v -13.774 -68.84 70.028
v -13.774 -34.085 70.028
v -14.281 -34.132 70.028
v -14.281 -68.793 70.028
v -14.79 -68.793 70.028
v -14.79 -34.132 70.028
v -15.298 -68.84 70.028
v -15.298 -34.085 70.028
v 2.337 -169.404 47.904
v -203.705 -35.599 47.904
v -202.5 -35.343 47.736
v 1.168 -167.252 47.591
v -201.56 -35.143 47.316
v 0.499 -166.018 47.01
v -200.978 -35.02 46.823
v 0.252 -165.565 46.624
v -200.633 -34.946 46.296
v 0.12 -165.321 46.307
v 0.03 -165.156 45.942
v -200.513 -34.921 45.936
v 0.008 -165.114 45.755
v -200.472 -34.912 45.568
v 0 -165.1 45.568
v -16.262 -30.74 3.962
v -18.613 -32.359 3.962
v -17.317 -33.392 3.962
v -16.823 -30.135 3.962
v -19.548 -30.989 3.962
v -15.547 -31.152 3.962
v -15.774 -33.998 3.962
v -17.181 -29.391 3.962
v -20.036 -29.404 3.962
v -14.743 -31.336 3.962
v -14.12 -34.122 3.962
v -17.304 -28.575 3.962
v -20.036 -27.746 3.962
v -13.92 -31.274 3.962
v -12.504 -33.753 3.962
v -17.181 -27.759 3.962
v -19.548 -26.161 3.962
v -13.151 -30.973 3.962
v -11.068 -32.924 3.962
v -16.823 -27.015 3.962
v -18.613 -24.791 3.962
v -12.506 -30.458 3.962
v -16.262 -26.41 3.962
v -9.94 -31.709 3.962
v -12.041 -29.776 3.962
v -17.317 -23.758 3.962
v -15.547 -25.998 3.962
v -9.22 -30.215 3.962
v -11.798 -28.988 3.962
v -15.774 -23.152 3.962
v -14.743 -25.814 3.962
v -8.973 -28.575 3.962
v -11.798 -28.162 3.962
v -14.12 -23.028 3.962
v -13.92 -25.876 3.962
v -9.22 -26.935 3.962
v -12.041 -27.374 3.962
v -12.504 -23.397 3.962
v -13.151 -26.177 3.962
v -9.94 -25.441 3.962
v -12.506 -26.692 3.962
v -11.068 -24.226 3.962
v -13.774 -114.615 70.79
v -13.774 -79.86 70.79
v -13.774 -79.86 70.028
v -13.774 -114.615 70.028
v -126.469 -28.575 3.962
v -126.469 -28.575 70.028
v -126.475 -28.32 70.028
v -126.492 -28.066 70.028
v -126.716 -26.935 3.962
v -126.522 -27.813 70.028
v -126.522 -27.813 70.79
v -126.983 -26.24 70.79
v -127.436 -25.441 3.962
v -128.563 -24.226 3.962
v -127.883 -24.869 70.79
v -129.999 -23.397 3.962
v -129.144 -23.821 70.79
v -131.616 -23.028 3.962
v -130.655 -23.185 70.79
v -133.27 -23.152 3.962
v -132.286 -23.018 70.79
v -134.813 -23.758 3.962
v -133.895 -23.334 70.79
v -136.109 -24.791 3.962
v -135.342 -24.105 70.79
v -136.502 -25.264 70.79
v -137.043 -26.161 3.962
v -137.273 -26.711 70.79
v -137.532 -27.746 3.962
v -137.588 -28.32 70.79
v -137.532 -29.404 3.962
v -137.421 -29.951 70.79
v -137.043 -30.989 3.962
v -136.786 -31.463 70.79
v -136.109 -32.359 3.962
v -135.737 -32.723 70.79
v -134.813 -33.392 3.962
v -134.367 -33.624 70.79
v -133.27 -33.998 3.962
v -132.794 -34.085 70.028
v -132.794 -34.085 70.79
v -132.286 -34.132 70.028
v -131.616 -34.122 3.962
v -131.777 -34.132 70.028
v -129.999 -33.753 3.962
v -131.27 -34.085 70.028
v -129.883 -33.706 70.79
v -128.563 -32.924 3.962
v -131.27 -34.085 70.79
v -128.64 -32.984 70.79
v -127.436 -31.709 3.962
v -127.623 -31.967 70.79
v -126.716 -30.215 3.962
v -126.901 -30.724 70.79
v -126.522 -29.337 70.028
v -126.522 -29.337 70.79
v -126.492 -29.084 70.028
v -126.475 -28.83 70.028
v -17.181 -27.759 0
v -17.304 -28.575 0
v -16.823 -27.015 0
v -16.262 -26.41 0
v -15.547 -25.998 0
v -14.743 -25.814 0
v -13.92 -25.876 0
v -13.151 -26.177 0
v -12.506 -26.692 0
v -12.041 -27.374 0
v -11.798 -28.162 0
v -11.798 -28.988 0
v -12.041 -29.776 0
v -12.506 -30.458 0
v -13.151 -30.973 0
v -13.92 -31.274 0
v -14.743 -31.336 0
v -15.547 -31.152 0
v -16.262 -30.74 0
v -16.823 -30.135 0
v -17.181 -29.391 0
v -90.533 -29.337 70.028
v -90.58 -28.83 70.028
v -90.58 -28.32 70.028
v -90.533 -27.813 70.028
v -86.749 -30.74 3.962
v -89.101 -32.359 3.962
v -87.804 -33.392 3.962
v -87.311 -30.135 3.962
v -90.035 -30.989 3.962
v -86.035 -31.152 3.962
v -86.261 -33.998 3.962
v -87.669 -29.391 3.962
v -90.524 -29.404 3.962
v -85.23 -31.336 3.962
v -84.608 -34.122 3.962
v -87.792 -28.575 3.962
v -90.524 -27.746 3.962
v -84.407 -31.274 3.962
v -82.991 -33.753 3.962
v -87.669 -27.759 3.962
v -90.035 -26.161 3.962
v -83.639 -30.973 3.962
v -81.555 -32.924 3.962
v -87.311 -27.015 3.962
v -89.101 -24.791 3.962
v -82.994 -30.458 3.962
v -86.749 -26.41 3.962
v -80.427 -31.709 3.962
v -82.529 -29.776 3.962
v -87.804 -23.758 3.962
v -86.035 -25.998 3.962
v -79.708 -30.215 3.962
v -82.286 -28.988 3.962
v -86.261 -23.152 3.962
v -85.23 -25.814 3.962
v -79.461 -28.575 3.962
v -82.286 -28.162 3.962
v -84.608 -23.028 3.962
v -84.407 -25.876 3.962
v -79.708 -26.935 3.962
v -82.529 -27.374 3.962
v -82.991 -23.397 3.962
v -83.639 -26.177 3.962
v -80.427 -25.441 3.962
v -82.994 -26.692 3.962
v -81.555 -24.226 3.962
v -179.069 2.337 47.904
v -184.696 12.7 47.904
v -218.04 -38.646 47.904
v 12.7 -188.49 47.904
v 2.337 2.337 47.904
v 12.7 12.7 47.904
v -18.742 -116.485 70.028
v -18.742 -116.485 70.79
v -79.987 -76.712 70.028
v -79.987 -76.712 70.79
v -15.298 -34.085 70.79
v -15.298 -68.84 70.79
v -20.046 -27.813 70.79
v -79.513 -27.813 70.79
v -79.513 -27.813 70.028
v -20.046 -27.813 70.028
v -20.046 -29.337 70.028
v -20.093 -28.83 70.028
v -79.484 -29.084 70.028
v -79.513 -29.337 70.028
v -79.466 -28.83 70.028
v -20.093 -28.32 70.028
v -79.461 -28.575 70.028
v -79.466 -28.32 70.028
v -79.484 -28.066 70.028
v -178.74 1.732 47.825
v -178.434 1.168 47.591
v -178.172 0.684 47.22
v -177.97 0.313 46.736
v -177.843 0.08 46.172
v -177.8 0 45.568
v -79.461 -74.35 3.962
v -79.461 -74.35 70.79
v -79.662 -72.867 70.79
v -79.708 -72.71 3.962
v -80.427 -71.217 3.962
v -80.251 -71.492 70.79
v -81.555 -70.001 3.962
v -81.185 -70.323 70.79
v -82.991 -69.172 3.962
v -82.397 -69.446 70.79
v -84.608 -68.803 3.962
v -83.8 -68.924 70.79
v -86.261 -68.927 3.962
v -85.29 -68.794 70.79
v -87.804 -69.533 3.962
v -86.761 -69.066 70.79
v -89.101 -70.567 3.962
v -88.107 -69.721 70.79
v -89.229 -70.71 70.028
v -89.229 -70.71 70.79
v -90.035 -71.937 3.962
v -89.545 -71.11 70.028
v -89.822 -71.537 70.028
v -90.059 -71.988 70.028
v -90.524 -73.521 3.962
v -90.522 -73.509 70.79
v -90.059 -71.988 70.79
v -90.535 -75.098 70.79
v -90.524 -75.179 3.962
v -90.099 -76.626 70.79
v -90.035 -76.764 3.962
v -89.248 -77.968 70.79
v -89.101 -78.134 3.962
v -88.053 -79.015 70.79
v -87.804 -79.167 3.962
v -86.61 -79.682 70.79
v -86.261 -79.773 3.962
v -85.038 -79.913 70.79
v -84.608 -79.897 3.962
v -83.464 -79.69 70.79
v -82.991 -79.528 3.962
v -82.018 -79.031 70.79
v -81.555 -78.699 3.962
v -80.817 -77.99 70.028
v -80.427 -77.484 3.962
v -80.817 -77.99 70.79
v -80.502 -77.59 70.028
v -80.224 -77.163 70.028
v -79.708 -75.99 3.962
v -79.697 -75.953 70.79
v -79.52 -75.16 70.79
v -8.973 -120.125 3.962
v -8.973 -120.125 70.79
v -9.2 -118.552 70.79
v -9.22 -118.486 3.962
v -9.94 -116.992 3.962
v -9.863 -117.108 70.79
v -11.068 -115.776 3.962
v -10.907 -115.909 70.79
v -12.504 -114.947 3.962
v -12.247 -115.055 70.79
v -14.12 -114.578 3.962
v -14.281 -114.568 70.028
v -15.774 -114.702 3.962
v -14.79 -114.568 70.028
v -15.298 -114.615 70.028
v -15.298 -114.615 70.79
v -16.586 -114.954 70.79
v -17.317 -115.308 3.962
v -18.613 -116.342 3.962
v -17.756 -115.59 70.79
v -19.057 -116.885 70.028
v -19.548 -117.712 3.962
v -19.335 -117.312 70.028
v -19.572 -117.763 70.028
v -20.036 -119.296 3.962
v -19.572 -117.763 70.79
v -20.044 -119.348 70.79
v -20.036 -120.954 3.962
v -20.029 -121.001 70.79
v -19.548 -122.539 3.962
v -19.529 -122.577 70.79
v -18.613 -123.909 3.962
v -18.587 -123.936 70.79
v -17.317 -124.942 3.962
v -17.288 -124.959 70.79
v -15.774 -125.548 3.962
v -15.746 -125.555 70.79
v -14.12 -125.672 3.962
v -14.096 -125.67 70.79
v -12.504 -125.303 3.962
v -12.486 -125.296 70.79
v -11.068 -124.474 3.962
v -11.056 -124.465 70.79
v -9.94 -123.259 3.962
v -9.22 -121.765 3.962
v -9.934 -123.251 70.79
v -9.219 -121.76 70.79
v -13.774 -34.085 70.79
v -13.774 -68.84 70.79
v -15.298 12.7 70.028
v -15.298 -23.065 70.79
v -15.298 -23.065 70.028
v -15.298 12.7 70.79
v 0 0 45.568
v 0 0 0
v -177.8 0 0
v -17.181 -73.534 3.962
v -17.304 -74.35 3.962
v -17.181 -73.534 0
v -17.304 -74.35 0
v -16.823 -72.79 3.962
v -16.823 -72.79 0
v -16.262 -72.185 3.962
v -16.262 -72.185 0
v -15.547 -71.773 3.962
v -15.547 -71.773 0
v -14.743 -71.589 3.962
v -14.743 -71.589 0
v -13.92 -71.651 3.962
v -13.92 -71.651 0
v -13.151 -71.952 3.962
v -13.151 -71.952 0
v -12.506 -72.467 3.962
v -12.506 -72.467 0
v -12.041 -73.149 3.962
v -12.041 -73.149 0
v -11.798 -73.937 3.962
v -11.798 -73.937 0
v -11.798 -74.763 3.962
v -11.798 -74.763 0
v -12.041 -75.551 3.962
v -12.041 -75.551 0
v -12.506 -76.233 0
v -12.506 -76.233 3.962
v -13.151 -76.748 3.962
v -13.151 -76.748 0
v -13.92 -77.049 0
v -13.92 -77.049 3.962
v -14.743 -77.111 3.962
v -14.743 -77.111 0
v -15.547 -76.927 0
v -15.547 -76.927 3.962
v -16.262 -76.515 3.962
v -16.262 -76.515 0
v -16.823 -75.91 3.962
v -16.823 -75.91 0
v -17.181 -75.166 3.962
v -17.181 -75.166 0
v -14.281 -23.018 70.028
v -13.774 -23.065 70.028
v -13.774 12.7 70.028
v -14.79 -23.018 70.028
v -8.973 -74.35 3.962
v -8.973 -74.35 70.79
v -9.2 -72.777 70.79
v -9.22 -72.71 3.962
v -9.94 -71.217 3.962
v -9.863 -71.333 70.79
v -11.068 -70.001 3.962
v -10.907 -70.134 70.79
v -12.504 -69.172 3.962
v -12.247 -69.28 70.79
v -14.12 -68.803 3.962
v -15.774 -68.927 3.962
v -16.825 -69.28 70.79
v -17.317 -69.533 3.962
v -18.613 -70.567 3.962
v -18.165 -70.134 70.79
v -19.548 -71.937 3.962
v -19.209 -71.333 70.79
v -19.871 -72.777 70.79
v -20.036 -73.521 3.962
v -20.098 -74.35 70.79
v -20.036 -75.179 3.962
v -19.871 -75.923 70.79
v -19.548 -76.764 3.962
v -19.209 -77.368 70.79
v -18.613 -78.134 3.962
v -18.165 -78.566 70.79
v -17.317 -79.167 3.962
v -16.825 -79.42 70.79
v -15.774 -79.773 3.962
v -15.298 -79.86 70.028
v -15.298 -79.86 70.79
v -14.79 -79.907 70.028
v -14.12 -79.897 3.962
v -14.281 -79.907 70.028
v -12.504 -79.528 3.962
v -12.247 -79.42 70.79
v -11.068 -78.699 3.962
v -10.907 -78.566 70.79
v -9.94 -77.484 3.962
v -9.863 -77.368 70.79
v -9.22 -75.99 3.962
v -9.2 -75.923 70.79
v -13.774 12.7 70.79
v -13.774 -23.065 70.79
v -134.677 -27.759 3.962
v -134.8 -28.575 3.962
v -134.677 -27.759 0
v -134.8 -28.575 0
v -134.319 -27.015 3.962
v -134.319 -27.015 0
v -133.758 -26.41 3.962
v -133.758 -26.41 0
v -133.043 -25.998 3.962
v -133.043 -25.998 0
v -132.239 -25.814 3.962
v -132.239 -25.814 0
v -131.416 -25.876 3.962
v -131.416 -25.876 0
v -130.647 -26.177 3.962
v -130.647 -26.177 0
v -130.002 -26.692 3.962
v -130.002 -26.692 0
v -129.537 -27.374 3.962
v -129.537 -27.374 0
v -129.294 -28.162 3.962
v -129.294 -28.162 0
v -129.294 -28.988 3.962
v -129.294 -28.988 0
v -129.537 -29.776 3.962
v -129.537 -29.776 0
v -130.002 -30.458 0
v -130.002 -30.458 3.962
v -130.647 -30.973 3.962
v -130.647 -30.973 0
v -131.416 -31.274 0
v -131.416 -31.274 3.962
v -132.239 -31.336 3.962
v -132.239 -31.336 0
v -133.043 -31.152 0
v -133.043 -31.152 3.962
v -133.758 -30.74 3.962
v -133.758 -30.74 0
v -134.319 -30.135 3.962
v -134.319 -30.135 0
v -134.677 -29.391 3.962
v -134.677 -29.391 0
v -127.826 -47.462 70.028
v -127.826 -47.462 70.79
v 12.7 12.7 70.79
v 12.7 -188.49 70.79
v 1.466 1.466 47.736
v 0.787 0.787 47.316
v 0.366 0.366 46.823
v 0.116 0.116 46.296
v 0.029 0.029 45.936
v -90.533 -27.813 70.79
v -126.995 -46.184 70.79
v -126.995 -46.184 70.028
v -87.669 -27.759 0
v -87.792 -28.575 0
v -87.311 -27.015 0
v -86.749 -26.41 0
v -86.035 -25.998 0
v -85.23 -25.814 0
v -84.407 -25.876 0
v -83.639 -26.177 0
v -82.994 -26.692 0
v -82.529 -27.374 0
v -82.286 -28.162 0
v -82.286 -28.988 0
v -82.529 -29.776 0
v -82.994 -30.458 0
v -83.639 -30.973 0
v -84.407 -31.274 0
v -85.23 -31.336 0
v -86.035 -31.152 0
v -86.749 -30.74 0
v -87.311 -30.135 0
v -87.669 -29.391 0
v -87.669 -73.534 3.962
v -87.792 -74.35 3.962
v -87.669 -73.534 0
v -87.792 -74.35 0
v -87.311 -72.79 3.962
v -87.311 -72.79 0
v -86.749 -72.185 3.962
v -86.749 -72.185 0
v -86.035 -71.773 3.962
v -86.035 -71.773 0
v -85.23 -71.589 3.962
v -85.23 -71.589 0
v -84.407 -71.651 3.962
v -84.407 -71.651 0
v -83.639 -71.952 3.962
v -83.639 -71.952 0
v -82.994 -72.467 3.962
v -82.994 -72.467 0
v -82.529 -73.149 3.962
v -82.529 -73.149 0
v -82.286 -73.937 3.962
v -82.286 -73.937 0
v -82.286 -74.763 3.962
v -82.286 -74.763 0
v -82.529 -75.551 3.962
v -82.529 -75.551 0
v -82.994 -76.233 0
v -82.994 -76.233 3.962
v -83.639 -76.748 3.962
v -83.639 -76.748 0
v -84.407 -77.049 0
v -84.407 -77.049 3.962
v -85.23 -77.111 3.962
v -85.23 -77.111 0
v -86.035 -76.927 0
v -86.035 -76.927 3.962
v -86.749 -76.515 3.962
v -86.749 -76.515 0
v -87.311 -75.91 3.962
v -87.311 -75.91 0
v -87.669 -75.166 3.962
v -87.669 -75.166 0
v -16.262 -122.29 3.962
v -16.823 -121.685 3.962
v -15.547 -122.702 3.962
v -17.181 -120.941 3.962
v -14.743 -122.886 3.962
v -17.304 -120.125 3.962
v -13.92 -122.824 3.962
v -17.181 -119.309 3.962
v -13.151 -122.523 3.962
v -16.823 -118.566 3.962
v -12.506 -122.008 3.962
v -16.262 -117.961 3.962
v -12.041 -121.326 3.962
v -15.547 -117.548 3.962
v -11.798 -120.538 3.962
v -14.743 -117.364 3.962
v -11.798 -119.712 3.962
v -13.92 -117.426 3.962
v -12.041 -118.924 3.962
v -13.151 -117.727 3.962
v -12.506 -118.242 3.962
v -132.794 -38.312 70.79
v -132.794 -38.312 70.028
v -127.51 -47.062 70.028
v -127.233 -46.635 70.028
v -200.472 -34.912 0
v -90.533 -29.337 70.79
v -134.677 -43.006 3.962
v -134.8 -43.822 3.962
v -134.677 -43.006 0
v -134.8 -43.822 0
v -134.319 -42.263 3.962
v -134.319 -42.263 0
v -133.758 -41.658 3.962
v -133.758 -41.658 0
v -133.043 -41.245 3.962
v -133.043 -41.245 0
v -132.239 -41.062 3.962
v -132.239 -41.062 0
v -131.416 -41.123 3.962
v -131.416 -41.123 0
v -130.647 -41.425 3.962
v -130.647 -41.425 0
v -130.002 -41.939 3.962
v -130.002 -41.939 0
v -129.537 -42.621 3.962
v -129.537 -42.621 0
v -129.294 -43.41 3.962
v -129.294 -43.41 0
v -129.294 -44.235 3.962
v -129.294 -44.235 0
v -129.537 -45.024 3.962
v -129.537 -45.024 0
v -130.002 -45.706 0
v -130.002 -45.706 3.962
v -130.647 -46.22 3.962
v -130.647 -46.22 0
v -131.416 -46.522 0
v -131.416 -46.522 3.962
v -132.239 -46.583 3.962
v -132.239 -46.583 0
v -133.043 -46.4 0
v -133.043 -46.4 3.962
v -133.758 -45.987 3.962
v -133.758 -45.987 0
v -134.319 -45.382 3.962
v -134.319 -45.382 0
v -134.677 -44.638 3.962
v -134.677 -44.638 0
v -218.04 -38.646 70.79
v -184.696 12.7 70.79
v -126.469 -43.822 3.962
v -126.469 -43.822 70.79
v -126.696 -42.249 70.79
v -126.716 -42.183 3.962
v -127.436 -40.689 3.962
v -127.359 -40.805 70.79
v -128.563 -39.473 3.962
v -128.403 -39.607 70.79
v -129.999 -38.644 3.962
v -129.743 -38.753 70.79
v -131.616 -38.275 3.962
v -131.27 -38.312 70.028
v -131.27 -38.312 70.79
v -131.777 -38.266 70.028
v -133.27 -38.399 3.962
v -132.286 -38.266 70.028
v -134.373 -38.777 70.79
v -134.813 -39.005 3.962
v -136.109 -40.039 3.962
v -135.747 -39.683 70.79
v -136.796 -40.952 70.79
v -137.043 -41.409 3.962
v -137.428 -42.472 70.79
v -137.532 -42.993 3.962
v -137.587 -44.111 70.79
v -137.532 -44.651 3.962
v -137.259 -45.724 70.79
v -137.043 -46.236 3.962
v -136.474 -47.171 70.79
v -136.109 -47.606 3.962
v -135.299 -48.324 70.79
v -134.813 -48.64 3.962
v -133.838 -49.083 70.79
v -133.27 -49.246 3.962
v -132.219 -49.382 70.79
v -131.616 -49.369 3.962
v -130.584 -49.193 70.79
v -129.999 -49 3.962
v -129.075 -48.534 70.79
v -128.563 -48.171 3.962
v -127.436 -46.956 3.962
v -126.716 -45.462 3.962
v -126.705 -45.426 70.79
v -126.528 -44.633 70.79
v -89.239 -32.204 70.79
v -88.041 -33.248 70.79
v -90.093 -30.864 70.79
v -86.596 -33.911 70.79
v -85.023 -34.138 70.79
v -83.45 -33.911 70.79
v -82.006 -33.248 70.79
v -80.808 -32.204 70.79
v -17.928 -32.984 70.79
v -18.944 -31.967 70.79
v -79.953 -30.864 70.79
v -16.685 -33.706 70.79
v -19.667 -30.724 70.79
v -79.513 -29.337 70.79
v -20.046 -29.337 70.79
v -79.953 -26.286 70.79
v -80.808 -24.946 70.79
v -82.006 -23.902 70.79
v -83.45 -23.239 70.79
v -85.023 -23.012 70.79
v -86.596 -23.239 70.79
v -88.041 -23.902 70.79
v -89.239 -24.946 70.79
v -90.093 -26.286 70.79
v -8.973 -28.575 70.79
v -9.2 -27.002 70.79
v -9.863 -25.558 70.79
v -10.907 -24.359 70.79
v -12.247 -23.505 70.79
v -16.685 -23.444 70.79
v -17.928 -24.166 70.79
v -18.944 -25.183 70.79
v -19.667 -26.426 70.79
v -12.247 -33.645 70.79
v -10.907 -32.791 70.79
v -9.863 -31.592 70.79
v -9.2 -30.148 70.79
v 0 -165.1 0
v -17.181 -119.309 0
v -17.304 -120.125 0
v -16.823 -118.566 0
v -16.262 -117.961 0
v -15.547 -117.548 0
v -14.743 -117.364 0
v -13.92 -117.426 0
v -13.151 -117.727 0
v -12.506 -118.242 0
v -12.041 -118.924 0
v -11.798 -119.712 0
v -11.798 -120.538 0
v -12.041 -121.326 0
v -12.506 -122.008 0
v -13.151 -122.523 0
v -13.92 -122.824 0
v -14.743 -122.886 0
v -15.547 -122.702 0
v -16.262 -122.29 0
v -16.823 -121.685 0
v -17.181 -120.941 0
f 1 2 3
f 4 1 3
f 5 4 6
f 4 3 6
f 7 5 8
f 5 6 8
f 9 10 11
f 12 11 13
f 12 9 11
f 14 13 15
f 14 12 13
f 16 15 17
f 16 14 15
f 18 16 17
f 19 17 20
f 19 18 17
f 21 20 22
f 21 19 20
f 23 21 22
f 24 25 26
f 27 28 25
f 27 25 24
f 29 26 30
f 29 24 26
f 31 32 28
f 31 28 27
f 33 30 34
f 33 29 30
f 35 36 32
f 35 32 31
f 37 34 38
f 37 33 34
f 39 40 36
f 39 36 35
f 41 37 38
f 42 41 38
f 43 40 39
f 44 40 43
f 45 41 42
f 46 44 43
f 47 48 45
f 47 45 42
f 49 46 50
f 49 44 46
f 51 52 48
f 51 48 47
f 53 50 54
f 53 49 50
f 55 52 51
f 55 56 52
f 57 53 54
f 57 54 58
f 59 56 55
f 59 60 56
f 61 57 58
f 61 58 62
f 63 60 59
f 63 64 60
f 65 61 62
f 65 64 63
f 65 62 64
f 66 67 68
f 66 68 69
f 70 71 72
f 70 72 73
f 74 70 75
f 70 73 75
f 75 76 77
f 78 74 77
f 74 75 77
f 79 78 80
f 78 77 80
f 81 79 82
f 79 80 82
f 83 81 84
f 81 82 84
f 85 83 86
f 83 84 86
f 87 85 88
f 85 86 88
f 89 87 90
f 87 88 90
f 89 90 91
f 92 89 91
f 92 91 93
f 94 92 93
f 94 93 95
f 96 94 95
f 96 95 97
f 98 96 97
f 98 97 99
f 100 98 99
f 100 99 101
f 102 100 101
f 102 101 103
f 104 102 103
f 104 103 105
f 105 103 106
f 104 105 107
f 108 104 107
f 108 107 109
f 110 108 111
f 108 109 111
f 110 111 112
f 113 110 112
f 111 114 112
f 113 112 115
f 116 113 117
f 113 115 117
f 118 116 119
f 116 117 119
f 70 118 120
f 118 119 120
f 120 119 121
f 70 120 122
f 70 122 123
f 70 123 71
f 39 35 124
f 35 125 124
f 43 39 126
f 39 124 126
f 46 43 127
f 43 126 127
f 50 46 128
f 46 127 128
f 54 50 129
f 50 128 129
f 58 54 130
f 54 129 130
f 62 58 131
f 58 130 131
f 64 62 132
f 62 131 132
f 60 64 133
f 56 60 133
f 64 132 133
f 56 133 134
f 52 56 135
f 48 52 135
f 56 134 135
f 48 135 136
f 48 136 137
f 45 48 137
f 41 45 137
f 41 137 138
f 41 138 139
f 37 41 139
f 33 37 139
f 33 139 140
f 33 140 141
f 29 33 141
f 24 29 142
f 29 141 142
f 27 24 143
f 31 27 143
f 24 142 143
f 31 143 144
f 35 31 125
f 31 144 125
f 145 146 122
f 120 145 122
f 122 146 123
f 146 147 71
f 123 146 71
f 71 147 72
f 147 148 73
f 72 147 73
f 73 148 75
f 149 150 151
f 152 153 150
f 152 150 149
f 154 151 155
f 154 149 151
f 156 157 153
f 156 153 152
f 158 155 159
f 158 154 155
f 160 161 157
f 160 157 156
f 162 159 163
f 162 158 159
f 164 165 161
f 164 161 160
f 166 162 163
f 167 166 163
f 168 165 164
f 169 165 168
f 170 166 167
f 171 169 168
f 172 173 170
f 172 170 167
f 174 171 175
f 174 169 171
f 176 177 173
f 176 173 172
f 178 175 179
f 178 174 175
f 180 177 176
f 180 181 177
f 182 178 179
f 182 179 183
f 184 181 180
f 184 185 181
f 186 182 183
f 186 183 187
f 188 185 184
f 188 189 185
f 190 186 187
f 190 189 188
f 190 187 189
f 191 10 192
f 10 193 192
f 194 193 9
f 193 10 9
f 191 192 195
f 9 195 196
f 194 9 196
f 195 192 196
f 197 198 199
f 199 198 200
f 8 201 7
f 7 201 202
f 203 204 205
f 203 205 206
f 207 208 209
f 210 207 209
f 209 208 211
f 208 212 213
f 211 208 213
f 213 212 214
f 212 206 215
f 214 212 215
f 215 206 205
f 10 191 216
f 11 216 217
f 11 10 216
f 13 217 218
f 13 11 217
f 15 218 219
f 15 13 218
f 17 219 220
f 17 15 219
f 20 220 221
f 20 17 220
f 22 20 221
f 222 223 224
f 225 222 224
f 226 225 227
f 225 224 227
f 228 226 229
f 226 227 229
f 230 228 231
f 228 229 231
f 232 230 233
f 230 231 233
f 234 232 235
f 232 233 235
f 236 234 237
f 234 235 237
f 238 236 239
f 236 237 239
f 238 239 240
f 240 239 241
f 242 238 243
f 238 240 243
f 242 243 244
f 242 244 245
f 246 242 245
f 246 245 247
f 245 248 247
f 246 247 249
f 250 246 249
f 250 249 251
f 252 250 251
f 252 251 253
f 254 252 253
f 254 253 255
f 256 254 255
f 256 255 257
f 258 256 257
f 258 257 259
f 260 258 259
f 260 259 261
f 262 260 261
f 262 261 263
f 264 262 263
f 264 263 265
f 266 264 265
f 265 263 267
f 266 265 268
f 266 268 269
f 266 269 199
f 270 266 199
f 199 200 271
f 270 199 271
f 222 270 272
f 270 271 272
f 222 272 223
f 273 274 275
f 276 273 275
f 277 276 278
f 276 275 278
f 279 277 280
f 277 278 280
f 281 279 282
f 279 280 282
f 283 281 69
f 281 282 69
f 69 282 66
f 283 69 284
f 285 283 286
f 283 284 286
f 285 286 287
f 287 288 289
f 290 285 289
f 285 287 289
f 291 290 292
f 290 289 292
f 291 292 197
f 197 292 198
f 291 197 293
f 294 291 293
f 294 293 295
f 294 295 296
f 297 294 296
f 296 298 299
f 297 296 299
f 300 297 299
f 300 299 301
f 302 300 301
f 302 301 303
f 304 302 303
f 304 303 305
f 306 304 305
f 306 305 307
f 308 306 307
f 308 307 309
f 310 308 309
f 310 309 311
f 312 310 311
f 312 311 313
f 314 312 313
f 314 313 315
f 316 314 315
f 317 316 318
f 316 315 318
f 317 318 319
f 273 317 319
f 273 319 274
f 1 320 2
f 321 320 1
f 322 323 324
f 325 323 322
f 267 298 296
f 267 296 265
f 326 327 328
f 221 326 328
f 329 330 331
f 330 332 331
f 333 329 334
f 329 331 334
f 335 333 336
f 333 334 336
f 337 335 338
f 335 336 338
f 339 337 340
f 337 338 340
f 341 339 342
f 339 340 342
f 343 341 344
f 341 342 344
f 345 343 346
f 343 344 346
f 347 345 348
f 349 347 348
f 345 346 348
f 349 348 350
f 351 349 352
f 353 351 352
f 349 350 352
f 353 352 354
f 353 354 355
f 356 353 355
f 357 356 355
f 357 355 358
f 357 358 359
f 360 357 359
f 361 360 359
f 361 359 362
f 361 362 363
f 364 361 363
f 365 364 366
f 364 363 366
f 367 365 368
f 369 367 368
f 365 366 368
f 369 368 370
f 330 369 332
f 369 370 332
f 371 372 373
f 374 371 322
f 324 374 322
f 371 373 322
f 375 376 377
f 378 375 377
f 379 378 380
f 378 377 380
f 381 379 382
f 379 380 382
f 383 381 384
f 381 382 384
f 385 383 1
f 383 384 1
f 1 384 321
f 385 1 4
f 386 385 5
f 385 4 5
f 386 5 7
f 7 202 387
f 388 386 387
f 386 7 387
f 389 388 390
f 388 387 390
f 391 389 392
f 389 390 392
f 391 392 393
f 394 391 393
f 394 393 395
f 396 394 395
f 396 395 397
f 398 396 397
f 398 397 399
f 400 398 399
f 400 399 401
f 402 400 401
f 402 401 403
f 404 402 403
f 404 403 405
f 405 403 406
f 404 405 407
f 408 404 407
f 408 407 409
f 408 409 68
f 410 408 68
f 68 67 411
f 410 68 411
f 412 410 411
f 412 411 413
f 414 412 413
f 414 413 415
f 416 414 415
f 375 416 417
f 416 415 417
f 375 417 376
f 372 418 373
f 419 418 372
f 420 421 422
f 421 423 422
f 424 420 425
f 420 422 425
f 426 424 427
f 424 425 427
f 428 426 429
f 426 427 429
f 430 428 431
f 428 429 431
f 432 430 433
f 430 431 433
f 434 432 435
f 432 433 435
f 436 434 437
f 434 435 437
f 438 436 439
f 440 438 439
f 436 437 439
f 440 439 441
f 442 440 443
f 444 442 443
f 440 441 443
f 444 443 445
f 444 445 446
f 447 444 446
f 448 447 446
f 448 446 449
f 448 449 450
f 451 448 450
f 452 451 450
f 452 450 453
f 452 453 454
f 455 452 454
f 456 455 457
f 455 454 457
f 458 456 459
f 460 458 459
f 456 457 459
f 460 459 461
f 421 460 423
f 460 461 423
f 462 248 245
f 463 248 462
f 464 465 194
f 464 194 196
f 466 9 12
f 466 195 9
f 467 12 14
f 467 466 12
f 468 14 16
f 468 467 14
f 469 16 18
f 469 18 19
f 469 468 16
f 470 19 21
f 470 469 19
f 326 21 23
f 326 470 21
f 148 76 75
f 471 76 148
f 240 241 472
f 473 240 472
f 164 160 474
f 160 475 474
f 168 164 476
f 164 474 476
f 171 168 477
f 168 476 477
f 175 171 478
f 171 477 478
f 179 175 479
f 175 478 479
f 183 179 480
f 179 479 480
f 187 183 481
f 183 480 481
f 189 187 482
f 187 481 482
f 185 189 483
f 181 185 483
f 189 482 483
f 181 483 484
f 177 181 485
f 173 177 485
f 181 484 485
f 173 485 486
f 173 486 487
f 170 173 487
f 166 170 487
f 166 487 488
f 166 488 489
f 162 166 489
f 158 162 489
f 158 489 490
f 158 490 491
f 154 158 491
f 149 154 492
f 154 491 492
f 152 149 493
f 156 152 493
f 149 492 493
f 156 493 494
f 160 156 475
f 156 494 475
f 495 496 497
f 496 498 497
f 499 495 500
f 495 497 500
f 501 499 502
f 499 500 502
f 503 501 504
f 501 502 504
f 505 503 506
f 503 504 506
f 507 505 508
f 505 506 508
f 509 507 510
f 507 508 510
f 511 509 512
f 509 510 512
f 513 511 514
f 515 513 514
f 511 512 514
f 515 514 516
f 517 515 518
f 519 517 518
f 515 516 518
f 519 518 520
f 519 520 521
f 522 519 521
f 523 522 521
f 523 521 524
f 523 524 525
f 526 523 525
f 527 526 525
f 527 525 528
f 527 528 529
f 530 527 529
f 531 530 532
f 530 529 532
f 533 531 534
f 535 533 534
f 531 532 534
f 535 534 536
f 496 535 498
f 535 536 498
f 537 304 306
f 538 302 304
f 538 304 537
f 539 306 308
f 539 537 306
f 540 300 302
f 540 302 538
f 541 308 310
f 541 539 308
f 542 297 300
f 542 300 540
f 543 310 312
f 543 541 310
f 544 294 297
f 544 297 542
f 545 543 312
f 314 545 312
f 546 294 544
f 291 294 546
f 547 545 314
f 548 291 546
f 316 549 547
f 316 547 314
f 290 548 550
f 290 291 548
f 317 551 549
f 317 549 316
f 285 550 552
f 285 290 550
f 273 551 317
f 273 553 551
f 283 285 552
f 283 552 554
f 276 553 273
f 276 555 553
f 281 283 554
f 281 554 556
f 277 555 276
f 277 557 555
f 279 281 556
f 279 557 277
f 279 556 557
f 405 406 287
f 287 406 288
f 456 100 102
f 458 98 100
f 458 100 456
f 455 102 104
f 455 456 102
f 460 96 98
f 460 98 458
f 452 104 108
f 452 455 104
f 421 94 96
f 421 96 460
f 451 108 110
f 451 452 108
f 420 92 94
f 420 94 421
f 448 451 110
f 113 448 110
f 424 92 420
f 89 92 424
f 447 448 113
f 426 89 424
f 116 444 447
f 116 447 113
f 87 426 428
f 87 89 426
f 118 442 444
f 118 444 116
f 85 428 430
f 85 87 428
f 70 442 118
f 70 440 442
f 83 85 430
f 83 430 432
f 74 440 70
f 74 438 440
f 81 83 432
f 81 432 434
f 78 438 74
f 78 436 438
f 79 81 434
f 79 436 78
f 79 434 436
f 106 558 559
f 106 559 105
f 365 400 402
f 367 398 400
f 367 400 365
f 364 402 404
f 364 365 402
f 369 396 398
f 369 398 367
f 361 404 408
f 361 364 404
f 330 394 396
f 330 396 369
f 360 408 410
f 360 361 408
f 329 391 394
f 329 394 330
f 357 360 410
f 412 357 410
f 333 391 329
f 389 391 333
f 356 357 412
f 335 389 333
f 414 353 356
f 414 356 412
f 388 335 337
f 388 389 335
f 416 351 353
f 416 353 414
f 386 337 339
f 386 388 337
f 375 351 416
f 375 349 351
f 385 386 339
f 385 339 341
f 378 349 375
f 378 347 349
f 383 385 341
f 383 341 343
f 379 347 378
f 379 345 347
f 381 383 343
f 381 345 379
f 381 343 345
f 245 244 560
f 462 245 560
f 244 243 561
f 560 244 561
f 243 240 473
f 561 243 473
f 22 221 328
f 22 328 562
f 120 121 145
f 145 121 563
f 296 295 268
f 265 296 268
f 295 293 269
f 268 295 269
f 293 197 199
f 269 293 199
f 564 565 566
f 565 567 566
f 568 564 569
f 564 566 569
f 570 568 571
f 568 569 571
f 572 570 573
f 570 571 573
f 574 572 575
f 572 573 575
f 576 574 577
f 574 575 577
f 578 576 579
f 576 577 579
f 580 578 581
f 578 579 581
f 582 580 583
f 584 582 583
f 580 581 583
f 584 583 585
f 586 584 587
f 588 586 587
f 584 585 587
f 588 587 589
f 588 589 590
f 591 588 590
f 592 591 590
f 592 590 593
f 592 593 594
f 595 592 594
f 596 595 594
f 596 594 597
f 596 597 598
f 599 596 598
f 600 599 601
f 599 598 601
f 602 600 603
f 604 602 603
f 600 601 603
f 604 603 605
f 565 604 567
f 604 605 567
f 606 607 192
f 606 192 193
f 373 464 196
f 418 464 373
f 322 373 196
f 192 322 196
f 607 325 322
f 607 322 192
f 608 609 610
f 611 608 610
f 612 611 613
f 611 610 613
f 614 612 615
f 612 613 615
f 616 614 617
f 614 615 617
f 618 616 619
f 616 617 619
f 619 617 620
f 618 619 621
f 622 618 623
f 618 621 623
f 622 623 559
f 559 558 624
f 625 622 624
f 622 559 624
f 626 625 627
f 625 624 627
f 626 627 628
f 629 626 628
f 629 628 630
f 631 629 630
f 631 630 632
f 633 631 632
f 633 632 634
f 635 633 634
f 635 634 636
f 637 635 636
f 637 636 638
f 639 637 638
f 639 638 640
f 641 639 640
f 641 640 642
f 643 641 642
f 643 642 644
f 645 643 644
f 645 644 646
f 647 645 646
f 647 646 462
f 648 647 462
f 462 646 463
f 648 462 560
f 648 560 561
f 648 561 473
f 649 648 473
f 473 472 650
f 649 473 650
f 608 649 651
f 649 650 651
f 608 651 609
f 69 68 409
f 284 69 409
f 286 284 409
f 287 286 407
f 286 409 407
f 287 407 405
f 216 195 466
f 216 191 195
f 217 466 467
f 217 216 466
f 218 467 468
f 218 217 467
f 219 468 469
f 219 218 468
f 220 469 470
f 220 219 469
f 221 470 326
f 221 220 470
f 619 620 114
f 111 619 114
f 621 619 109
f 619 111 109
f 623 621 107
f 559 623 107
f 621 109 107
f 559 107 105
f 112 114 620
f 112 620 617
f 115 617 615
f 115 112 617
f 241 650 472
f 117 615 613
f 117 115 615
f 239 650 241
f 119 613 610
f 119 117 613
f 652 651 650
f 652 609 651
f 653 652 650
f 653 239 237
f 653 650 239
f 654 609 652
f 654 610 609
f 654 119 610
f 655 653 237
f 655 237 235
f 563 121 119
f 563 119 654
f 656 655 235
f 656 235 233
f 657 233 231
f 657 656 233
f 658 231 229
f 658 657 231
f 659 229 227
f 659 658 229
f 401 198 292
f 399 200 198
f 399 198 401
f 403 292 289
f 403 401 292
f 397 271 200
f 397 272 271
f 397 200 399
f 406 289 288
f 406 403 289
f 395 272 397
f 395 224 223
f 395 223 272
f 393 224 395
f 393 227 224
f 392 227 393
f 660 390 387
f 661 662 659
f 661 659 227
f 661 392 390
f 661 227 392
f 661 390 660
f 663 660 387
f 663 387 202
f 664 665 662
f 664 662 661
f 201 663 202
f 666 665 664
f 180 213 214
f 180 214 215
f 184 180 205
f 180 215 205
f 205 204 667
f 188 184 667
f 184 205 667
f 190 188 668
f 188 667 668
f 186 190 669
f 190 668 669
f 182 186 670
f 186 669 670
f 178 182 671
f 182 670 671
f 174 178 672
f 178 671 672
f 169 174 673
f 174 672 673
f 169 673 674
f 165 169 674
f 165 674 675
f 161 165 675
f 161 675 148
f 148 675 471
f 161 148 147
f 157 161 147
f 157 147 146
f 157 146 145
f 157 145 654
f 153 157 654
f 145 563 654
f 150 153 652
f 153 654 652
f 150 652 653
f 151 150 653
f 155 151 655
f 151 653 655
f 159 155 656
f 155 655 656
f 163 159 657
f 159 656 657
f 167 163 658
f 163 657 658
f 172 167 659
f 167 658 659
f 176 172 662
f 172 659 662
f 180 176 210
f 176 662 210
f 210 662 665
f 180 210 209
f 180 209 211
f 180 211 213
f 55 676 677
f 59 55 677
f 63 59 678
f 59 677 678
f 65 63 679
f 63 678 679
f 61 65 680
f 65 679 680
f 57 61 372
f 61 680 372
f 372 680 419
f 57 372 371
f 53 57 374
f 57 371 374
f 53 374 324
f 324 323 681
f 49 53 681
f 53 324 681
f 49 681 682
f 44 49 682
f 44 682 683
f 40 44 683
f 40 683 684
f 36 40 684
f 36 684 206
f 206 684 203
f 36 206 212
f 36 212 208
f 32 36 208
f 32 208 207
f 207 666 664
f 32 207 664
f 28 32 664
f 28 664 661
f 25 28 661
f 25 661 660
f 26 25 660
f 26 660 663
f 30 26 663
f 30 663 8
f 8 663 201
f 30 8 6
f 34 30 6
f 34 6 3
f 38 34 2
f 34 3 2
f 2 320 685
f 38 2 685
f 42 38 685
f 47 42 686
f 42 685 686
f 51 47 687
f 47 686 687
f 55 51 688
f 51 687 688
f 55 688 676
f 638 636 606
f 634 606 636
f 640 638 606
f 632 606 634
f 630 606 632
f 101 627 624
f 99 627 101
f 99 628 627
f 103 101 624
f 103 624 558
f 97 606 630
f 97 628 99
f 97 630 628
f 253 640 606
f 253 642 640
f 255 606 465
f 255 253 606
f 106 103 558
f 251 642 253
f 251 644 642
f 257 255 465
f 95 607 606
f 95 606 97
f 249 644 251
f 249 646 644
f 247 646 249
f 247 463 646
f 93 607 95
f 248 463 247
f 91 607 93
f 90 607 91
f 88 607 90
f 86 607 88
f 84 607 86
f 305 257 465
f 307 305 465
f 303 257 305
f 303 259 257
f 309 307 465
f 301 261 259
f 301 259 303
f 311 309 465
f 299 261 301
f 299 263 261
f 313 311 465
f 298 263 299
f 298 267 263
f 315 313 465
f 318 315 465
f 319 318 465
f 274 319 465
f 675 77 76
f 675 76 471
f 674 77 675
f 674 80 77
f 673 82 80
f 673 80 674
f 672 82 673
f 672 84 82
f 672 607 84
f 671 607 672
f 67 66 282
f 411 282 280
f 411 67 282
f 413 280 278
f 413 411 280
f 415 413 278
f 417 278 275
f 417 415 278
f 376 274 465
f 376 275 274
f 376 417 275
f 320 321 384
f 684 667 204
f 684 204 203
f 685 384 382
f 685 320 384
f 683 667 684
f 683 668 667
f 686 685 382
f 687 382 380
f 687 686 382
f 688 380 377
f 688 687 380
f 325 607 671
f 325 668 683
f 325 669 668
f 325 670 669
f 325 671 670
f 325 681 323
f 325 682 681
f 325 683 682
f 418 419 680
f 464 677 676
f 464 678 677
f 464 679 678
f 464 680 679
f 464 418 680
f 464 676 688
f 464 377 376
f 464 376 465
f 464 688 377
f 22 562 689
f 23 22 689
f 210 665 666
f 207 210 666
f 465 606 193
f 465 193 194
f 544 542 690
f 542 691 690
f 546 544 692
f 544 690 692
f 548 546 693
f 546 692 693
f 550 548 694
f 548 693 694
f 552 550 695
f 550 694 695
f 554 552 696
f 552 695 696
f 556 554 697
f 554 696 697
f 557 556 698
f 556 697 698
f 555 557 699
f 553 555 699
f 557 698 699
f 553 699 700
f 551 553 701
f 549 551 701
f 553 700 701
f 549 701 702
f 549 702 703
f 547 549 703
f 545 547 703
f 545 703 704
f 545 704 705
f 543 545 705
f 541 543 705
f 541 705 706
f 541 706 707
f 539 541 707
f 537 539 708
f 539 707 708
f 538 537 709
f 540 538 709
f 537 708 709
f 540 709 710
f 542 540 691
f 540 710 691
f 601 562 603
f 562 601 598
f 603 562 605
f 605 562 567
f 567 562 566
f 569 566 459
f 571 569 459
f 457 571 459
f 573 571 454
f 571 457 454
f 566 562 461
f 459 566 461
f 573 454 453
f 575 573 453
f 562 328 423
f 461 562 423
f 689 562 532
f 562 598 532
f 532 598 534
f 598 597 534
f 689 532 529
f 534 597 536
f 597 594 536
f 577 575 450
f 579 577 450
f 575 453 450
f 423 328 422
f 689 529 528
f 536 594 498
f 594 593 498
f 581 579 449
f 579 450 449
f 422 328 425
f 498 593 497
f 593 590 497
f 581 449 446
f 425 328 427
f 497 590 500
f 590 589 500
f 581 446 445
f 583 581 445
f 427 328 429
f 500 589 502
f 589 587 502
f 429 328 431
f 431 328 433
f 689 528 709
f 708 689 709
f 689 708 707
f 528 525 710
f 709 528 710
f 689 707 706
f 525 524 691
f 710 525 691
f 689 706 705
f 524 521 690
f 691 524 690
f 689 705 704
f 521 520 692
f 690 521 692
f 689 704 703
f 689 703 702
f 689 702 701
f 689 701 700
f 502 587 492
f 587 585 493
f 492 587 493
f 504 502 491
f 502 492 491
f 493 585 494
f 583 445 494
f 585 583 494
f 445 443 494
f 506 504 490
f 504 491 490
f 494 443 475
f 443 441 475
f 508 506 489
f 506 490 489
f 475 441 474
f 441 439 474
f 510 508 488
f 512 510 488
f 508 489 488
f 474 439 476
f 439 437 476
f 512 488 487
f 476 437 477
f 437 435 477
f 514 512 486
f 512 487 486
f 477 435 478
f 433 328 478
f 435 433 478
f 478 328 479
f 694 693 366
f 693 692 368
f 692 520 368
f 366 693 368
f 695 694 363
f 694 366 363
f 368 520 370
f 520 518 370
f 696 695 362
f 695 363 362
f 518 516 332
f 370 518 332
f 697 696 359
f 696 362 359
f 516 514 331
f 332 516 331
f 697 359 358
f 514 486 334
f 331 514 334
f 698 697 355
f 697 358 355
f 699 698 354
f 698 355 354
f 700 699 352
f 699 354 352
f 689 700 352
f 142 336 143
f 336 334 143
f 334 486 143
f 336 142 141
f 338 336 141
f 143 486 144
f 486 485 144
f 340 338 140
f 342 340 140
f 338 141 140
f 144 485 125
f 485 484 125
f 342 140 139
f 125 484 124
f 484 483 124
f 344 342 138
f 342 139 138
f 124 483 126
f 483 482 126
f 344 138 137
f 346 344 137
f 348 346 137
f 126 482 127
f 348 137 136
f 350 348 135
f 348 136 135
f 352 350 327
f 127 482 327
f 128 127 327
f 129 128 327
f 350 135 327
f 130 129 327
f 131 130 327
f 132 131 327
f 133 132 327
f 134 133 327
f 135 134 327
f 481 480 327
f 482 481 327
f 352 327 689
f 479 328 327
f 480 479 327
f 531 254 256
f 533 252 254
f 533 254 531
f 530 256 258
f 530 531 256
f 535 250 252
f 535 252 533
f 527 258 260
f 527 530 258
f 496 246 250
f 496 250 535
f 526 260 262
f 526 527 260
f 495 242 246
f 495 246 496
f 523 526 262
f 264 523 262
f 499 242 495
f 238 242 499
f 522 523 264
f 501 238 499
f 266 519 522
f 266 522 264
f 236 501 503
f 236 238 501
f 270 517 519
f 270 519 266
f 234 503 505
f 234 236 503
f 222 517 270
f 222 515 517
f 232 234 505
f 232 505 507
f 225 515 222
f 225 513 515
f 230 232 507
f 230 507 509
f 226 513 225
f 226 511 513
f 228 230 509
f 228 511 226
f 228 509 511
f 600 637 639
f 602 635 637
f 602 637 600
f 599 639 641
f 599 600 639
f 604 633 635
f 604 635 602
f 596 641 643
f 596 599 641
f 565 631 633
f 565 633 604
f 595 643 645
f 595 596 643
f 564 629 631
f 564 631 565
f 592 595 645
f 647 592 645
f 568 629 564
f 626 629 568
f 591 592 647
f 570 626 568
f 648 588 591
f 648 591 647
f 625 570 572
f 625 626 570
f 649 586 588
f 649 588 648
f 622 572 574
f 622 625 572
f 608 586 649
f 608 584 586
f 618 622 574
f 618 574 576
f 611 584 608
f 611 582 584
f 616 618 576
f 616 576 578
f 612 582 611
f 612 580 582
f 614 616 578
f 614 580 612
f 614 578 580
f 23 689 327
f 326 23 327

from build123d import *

# Parameters (mm, degrees)
BOSS_EXTRUDE1_DEPTH                             = 70.7898
CBORE_FOR_10_SOCKET_HEAD_CAP_SCREW1_D           = 5.5372
CBORE_FOR_10_SOCKET_HEAD_CAP_SCREW1_CBORE_D     = 11.1252
CBORE_FOR_10_SOCKET_HEAD_CAP_SCREW1_CBORE_DEPTH = 66.8274
BOSS_EXTRUDE2_DEPTH                             = 22.8854
FILLET2_R                                       = 2.3368
CUT_EXTRUDE1_DEPTH                              = 0.762


with BuildPart() as part:
    # Sketch1 → Boss-Extrude1 (new body)
    with BuildSketch(Plane.XY):
        Polygon((-177.8, 0), (-200.472065098, -34.911918701), (0, -165.1), (0, 0), align=None)
    extrude(amount=BOSS_EXTRUDE1_DEPTH)

    # CBORE for #10 Socket Head Cap Screw1 (through all)
    with Locations(Plane.XY.offset(70.7898)):
        with Locations((-132.031708342, -28.575), (-14.535778015, -28.575), (-14.535778015, -74.350066155), (-14.535778015, -120.125132311), (-85.023198604, -74.350066155), (-85.023198604, -28.575), (-132.031708342, -43.822382986)):
            CounterBoreHole(CBORE_FOR_10_SOCKET_HEAD_CAP_SCREW1_D / 2, CBORE_FOR_10_SOCKET_HEAD_CAP_SCREW1_CBORE_D / 2, CBORE_FOR_10_SOCKET_HEAD_CAP_SCREW1_CBORE_DEPTH)

    # Sketch13 → Boss-Extrude2 (add)
    with BuildSketch(Plane.XY.offset(70.7898)):
        Polygon((12.7, 12.7), (-184.695537385, 12.7), (-218.040097055, -38.64611917), (12.7, -188.490490253), align=None)
        Polygon((0, -165.1), (0, 0), (-177.8, 0), (-200.472065098, -34.911918701), align=None, mode=Mode.SUBTRACT)
    extrude(amount=-BOSS_EXTRUDE2_DEPTH)

    # Fillet2
    fillet2_edges = [part.edges().sort_by_distance(p)[0] for p in [
        (-189.136032549, -17.455959351, 47.9044),
        (-100.236032549, -100.005959351, 47.9044),
        (0, -82.55, 47.9044),
        (-88.9, 0, 47.9044),
    ]]
    fillet(fillet2_edges, radius=FILLET2_R)

    # Sketch14 → Cut-Extrude1 (cut)
    with BuildSketch(Plane.XY.offset(70.7898)):
        with BuildLine():
            Line((-14.950792959, -120.764199283), (-132.446723286, -44.461449959))
            ThreePointArc((-132.446723286, -44.461449959), (-132.701366981, -44.185977962), (-132.793708342, -43.822382986))
            Line((-132.793708342, -43.822382986), (-132.793708342, -28.575))
            ThreePointArc((-132.793708342, -28.575), (-132.570523709, -28.036184633), (-132.031708342, -27.813))
            Line((-132.031708342, -27.813), (-15.297778015, -27.813))
            Line((-15.297778015, -27.813), (-15.297778015, 12.7))
            Line((-15.297778015, 12.7), (-13.773778015, 12.7))
            Line((-13.773778015, 12.7), (-13.773778015, -120.125132311))
            ThreePointArc((-13.773778015, -120.125132311), (-14.172183039, -120.79479095), (-14.950792959, -120.764199283))
        make_face()
        with BuildLine():
            Line((-16.474792959, -117.957340453), (-130.922723286, -43.633985473))
            ThreePointArc((-130.922723286, -43.633985473), (-131.177366981, -43.358513475), (-131.269708342, -42.9949185))
            Line((-131.269708342, -42.9949185), (-131.269708342, -30.099))
            ThreePointArc((-131.269708342, -30.099), (-131.046523709, -29.560184633), (-130.507708342, -29.337))
            Line((-130.507708342, -29.337), (-15.297778015, -29.337))
            Line((-15.297778015, -29.337), (-15.297778015, -117.31827348))
            ThreePointArc((-15.297778015, -117.31827348), (-15.696183039, -117.98793212), (-16.474792959, -117.957340453))
        make_face(mode=Mode.SUBTRACT)
    extrude(amount=-CUT_EXTRUDE1_DEPTH, mode=Mode.SUBTRACT)


solid = part.part
